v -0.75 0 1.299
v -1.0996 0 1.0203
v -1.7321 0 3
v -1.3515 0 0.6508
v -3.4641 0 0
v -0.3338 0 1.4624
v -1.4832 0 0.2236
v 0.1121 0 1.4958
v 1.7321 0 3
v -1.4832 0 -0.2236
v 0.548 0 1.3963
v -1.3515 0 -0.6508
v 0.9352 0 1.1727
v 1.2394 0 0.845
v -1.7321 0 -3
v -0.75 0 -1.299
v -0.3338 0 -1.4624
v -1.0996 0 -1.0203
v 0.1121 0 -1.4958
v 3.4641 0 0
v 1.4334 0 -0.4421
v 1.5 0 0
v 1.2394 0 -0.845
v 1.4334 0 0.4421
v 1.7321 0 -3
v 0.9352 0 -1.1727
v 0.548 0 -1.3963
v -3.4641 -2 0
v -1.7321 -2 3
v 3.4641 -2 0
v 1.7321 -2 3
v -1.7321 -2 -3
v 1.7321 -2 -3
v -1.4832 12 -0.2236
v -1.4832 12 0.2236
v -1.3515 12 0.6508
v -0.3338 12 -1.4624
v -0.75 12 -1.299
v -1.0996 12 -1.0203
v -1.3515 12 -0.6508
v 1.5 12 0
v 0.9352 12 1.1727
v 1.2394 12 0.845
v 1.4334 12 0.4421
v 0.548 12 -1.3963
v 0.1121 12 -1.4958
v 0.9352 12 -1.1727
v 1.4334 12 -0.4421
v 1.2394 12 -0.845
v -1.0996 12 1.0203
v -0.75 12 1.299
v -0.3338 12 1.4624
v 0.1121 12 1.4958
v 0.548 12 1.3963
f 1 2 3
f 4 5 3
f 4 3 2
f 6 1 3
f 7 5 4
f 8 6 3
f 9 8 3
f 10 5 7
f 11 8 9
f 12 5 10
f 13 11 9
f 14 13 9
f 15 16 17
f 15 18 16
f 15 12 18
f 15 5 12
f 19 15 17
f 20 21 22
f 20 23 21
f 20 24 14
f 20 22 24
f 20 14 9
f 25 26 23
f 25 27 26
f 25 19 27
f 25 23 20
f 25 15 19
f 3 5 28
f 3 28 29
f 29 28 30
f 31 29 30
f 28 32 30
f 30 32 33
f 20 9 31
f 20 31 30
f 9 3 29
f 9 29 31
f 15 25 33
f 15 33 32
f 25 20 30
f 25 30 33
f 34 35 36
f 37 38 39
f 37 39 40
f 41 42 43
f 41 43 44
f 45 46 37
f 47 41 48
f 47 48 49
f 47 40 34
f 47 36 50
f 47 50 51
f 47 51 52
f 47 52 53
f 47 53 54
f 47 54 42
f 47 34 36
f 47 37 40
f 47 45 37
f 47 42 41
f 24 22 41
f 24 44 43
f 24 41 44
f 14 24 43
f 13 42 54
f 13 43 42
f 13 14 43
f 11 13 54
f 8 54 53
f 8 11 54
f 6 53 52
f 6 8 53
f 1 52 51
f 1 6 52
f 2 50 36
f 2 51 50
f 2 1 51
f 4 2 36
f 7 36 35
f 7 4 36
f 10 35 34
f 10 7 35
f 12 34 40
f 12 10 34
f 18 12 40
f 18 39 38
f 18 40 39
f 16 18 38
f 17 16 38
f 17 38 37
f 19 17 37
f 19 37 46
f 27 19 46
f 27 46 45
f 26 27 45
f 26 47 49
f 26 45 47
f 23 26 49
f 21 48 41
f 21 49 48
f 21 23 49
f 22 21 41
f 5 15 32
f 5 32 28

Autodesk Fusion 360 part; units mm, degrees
sketch "Sketch1" plane through (0, 0, 0) normal (0, 1, 0) x (1, 0, 0)
  circle A0 centre (0, 0) radius 1.5
  line L0 (-1.7321, 3) -> (-3.4641, 0)
  line L1 (-3.4641, 0) -> (-1.7321, -3)
  line L2 (-1.7321, -3) -> (1.7321, -3)
  line L3 (1.7321, -3) -> (3.4641, 0)
  line L4 (3.4641, 0) -> (1.7321, 3)
  line L5 (1.7321, 3) -> (-1.7321, 3)
  dimension "d1" = 3
  dimension "d2" = 6
extrude "Extrude1" add sketch "Sketch1" along normal blind 12 contours A0
extrude "Extrude2" add sketch "Sketch1" against normal blind 2 contours A0 | L0 L1 L2 L3 L4 L5
